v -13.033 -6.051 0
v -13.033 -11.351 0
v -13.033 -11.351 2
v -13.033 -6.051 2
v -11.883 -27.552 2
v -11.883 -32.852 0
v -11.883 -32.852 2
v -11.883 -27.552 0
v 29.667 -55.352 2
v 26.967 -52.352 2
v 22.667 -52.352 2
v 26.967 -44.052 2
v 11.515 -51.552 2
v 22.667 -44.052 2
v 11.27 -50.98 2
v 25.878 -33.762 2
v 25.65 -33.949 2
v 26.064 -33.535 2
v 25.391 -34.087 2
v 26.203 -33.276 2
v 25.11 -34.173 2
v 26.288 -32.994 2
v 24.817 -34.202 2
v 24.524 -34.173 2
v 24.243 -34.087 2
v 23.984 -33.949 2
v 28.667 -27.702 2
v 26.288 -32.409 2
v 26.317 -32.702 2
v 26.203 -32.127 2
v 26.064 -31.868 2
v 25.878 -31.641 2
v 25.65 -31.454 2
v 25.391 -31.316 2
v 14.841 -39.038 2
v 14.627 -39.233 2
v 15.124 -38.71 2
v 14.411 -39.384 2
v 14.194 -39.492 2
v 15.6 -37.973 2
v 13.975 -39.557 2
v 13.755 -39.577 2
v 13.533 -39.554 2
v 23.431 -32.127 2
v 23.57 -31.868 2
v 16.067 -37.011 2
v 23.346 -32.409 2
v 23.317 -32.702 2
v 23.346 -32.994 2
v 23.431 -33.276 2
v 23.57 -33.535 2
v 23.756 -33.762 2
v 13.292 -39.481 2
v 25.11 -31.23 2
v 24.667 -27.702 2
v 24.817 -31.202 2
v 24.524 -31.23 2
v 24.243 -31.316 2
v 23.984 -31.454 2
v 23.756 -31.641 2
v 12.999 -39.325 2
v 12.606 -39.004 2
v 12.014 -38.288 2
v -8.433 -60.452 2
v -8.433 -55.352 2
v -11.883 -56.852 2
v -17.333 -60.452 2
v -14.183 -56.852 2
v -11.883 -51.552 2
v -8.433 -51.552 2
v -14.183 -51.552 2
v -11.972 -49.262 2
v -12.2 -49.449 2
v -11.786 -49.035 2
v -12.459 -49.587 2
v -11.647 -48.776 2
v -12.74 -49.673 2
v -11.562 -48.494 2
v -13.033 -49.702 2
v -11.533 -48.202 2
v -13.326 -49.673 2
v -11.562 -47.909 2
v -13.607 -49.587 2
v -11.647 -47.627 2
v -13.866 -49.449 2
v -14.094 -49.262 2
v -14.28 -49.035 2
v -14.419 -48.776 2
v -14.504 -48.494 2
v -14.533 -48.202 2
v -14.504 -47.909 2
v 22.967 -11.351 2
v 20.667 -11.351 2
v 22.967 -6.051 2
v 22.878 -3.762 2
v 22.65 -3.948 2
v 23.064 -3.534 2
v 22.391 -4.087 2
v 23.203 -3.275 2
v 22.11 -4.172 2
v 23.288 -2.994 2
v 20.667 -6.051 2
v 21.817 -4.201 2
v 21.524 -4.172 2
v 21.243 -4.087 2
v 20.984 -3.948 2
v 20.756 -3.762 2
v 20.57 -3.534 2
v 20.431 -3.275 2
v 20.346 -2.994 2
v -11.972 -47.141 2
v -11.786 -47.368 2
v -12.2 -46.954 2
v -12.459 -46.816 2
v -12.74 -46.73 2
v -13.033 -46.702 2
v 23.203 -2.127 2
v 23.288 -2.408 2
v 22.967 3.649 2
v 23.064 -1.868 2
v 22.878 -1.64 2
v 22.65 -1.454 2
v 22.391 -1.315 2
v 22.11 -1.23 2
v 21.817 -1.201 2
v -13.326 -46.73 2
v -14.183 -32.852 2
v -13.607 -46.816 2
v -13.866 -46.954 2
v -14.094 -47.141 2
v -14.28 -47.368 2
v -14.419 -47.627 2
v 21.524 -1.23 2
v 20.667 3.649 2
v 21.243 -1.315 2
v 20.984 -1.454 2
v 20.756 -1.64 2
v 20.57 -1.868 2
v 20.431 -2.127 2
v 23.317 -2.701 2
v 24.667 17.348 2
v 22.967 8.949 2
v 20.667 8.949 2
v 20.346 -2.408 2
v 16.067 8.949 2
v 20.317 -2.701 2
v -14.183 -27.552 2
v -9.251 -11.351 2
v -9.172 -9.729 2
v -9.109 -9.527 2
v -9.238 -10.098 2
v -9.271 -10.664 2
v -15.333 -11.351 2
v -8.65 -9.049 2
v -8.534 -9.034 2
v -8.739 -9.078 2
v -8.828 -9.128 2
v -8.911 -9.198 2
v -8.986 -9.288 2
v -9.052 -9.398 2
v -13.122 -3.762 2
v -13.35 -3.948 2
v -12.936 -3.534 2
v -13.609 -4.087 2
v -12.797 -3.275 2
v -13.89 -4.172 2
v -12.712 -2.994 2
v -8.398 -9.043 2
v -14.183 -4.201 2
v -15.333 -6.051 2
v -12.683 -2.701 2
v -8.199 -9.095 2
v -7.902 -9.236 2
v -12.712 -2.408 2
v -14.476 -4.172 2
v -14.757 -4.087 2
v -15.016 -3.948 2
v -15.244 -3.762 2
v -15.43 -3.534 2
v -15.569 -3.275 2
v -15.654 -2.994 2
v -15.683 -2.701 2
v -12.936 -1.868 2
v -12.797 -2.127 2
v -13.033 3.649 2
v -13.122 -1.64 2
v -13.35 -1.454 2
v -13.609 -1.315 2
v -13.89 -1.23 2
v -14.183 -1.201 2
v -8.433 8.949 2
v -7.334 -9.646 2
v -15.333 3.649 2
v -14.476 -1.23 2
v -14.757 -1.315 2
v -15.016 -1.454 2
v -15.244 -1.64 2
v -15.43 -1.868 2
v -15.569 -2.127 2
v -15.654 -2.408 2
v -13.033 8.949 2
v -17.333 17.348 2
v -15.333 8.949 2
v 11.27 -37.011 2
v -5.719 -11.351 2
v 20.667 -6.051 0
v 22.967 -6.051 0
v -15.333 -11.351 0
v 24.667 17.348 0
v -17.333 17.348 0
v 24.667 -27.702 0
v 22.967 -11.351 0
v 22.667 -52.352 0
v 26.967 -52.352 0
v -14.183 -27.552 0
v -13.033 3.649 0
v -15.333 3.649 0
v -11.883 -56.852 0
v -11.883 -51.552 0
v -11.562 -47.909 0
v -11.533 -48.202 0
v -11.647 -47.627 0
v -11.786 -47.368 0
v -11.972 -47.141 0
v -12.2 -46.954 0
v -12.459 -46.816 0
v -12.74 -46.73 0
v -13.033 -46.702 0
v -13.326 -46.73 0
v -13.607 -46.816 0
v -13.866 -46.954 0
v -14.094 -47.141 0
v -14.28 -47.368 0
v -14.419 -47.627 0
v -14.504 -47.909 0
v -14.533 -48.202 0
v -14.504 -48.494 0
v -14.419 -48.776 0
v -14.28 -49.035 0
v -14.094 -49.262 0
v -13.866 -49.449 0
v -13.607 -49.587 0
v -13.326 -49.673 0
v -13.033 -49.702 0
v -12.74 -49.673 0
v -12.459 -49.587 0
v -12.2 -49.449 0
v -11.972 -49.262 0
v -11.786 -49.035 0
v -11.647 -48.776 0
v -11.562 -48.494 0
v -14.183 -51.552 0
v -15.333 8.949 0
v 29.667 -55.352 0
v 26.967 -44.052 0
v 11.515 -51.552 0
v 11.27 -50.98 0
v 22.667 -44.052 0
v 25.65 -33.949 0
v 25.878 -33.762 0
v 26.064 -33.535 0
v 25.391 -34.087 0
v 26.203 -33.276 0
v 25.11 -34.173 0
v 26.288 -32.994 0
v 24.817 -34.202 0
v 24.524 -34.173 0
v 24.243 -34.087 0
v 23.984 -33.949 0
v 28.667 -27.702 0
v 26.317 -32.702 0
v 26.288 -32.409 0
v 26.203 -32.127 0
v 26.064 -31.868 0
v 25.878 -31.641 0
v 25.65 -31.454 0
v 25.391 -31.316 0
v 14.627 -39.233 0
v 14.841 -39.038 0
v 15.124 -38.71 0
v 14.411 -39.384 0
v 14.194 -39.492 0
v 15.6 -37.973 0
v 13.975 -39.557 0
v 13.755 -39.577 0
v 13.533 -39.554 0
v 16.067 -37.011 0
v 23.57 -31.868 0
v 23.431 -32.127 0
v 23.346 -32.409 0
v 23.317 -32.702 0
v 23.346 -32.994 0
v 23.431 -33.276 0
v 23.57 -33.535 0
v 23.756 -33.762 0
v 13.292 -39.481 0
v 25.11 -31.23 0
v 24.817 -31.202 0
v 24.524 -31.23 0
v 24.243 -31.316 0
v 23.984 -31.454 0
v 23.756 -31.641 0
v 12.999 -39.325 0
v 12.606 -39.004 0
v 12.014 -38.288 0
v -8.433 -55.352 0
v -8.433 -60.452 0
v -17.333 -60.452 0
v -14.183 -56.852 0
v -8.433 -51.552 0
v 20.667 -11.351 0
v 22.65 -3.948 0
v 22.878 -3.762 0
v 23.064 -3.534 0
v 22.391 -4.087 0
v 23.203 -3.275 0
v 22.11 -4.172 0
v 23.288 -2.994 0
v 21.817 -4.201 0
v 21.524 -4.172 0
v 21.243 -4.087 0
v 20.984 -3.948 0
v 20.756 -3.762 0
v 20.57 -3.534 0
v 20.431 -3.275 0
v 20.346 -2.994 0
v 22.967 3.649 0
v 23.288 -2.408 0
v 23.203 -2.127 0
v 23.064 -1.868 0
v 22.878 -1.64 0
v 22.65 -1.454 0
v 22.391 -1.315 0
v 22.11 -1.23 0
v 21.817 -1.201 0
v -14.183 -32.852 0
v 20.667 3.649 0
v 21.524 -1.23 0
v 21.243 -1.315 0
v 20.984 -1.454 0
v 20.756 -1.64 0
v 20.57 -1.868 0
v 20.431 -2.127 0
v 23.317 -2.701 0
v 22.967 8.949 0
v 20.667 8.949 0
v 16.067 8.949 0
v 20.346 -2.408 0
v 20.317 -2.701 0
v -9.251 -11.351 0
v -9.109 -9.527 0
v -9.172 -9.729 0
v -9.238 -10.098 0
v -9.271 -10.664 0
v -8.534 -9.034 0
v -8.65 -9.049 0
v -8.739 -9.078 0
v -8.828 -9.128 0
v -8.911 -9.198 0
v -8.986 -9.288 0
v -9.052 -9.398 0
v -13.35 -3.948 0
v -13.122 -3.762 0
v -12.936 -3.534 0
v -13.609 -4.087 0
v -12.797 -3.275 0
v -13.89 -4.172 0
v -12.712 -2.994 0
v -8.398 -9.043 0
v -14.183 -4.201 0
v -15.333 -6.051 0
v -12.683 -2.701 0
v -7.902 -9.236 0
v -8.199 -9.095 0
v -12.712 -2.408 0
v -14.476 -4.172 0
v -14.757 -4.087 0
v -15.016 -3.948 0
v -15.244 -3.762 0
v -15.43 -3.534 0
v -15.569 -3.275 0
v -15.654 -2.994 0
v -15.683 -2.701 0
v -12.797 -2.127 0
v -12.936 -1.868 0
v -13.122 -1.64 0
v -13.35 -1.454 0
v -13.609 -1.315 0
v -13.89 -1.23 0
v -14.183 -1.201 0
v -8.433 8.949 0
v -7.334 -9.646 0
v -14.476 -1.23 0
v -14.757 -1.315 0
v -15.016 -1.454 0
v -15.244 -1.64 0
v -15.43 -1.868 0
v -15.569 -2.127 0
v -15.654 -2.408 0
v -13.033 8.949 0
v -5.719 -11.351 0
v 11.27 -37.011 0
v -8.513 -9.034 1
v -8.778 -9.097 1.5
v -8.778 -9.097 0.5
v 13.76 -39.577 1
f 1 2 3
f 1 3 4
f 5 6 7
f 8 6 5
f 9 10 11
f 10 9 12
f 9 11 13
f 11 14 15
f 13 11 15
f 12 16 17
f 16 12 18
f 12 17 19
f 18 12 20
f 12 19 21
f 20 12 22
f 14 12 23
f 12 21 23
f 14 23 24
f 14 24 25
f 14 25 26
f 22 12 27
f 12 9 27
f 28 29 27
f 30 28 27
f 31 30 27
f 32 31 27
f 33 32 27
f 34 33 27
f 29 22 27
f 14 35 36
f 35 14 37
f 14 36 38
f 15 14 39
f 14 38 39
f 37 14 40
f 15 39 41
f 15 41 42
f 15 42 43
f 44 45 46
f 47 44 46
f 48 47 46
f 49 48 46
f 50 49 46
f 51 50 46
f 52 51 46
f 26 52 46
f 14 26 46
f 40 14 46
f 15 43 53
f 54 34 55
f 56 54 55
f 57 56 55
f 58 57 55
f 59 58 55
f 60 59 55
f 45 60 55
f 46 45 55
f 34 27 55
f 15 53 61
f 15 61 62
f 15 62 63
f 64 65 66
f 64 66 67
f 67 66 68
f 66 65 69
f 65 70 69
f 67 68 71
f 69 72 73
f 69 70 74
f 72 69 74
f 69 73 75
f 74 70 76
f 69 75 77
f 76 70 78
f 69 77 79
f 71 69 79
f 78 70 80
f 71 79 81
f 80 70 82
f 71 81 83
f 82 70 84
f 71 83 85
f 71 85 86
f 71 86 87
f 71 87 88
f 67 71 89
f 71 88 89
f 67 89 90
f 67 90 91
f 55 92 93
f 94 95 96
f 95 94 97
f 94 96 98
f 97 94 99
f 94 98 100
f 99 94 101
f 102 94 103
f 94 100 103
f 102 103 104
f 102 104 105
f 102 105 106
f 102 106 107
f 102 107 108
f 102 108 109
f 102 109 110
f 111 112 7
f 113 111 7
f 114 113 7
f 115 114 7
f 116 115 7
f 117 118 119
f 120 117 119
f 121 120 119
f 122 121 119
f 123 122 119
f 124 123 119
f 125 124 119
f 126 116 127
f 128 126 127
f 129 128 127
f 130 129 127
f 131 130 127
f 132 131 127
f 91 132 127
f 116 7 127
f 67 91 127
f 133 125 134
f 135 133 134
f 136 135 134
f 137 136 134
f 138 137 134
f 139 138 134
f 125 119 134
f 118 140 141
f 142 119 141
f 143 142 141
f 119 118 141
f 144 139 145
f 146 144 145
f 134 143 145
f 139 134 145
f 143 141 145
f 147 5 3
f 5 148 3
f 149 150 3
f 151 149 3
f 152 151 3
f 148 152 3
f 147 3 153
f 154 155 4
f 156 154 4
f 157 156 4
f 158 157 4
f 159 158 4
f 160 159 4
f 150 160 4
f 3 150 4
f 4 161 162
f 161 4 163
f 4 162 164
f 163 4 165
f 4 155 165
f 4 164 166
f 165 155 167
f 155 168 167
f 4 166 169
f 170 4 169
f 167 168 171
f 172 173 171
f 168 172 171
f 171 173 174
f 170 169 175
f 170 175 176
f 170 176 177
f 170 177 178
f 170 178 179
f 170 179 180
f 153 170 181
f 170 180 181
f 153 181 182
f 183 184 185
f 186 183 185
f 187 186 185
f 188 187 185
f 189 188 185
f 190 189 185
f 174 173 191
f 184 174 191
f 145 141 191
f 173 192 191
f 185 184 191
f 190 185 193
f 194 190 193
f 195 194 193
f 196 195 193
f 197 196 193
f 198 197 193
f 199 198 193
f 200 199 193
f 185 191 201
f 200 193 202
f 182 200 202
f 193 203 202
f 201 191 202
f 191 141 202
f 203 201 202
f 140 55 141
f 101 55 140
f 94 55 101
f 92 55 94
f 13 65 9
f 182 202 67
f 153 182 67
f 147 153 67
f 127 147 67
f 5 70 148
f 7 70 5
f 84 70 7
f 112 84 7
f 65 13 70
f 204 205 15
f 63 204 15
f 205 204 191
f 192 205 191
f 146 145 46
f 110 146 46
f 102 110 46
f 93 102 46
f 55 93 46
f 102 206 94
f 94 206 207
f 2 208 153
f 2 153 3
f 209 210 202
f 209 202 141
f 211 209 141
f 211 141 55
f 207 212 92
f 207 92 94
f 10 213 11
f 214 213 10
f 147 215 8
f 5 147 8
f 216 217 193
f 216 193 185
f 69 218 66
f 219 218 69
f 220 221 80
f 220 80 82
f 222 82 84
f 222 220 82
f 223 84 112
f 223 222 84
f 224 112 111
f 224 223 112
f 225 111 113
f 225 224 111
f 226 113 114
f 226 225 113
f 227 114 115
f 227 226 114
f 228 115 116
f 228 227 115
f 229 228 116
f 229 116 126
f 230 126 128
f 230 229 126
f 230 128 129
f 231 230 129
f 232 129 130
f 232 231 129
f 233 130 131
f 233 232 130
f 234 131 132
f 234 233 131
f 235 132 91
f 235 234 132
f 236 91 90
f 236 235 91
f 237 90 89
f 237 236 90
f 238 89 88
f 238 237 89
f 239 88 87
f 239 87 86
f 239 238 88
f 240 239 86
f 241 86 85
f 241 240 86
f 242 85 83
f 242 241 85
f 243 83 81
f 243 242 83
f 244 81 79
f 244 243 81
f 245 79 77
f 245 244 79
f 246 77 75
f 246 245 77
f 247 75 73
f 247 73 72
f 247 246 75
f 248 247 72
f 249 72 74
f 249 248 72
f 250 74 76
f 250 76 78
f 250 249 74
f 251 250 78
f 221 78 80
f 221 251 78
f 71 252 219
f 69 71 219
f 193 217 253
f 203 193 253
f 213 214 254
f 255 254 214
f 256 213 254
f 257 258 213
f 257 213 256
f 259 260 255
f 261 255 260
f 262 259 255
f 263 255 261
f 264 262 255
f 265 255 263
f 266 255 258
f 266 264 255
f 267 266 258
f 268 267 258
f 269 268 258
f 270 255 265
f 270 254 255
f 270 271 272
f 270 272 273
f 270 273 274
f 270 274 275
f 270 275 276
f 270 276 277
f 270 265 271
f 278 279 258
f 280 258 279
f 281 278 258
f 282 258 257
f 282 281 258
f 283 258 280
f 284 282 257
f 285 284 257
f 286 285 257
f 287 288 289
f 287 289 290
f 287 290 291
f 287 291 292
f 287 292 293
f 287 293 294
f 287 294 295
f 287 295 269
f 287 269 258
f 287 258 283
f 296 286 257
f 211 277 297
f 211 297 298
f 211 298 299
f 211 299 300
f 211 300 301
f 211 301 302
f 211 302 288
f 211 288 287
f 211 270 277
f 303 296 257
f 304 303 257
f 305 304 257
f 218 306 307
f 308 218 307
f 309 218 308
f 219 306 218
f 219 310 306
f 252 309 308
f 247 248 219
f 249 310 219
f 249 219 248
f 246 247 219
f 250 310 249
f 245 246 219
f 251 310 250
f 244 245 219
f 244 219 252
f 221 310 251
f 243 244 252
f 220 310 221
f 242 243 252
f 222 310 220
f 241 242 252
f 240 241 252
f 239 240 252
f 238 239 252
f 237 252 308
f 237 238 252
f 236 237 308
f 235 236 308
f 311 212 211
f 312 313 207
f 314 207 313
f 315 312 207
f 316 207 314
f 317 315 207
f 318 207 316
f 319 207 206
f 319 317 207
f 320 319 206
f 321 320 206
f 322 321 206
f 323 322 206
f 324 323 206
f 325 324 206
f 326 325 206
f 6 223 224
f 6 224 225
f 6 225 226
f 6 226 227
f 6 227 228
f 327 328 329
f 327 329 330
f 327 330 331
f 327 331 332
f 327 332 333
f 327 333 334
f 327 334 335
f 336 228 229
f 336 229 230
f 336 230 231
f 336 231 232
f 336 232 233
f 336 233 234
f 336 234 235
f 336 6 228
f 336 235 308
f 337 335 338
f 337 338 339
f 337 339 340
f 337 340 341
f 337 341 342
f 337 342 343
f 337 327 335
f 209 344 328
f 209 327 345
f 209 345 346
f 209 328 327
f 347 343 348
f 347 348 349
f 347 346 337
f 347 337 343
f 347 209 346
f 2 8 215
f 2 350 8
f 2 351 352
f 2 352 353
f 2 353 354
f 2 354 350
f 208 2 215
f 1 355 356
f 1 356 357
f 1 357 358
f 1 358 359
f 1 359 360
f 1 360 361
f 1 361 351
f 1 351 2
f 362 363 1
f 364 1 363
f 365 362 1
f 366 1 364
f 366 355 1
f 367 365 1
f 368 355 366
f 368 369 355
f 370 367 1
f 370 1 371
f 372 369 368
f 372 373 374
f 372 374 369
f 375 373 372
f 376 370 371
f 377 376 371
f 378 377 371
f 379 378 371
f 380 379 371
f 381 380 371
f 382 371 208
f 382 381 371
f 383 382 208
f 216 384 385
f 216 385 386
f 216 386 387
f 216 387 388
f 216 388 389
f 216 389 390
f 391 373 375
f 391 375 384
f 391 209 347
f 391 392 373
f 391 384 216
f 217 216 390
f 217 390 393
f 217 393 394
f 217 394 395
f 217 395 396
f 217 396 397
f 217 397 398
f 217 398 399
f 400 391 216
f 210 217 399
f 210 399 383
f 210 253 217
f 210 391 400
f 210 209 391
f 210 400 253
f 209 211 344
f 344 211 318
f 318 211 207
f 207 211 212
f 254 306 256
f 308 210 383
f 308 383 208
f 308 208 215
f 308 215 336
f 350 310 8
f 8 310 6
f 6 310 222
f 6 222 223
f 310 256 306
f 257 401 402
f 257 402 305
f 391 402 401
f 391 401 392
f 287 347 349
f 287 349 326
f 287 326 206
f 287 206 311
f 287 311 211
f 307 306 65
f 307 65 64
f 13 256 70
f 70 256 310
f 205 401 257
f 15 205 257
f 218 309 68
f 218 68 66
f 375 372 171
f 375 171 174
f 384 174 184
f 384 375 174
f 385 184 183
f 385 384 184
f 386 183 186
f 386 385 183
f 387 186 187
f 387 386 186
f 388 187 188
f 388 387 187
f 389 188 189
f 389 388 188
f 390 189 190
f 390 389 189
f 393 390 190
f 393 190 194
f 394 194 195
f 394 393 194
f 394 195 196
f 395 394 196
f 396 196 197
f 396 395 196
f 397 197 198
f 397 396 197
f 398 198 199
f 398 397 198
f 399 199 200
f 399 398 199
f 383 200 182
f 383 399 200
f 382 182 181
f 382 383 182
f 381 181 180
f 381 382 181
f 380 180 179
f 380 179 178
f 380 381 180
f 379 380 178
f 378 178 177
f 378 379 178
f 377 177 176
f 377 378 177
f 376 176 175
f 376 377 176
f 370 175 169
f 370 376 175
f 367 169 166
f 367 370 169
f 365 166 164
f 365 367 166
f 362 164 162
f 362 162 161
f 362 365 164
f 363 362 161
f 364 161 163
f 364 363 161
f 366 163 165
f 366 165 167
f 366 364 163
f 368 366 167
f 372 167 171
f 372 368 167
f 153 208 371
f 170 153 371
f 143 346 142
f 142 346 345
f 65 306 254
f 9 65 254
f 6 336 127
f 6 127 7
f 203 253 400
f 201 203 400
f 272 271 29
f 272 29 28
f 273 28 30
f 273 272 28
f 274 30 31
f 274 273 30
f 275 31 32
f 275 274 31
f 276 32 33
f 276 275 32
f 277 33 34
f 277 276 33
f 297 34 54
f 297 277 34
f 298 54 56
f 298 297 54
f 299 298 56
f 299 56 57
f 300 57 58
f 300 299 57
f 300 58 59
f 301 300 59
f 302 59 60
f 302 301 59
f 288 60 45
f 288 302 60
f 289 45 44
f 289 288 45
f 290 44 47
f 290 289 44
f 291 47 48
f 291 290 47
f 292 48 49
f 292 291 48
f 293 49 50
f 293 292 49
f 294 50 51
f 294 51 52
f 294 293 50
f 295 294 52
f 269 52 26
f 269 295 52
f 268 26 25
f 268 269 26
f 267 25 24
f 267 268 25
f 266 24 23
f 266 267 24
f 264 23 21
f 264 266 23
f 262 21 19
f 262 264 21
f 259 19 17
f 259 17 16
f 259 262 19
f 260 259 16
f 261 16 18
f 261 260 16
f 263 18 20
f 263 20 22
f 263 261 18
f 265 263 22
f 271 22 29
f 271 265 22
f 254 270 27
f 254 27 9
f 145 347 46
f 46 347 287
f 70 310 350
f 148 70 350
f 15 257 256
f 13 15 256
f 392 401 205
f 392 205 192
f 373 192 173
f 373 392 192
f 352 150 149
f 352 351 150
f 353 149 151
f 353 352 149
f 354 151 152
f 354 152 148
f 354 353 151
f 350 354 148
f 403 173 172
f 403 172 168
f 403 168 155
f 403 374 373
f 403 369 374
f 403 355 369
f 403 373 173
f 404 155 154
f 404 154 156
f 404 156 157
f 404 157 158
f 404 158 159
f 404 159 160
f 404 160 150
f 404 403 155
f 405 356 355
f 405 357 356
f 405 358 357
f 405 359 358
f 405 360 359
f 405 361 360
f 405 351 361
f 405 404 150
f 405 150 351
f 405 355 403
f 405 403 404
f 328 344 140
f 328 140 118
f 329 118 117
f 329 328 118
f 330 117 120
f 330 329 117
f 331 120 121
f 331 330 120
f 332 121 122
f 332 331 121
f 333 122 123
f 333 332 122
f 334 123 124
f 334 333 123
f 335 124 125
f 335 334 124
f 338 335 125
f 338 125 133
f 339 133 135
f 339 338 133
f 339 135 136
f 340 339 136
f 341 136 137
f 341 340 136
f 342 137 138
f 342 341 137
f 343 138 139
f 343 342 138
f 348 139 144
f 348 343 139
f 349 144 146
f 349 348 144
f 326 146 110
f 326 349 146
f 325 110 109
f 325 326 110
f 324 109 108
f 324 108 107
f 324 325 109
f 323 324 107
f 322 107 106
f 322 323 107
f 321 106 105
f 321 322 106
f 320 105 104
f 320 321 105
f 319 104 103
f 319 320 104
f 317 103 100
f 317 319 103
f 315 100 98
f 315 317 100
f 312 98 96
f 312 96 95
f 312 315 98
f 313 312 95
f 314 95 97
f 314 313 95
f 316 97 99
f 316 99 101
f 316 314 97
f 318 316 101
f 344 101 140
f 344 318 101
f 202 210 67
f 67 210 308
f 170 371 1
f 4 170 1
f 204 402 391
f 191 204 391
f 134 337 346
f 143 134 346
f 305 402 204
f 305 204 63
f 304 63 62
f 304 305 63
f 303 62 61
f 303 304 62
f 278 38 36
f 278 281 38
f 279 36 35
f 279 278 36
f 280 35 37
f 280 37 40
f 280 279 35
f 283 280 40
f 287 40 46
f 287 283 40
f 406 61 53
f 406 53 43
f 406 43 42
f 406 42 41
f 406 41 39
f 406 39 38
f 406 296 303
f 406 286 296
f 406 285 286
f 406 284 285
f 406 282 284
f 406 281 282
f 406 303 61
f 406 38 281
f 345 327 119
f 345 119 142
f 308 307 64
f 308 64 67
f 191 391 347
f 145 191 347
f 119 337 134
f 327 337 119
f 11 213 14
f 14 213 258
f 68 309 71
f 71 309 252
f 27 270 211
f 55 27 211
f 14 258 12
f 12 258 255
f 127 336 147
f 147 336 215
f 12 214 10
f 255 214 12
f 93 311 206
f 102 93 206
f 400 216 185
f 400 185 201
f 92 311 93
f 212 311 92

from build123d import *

# Parameters (mm, degrees)
SKETCH_1_R      = 1.5
SKETCH_1_W      = 2.3
SKETCH_1_H      = 5.3
SKETCH_1_W_2    = 4.3
SKETCH_1_H_2    = 8.3
EXTRUDE_1_DEPTH = 2


with BuildPart() as part:
    # 草图1 → 凸台-拉伸1 (new body)
    with BuildSketch(Plane.XY):
        Polygon((24.667061038, 17.348475873), (24.667061038, -27.701524127), (26.667061038, -27.701524127), (28.667061038, -27.701524127), (29.667061038, -55.351524127), (22.667061038, -55.351524127), (20.667061038, -55.351524127), (-8.432938962, -55.351524127), (-8.432938962, -60.451524127), (-17.332938962, -60.451524127), (-17.332938962, -14.651524127), (-17.332938962, -11.651524127), (-17.332938962, 17.348475873), align=None)
        with Locations((-14.182938962, -2.700971973)):
            Circle(SKETCH_1_R, mode=Mode.SUBTRACT)
        with Locations((21.817061038, -2.700971973)):
            Circle(SKETCH_1_R, mode=Mode.SUBTRACT)
        with Locations((24.817061038, -32.701524127)):
            Circle(SKETCH_1_R, mode=Mode.SUBTRACT)
        with Locations((-13.032938962, -48.201524127)):
            Circle(SKETCH_1_R, mode=Mode.SUBTRACT)
        with Locations((-14.182938962, -8.700971973)):
            Rectangle(SKETCH_1_W, SKETCH_1_H, mode=Mode.SUBTRACT)
        with Locations((-14.182938962, 6.299028027)):
            Rectangle(SKETCH_1_W, SKETCH_1_H, mode=Mode.SUBTRACT)
        with Locations((21.817061038, 6.299028027)):
            Rectangle(SKETCH_1_W, SKETCH_1_H, mode=Mode.SUBTRACT)
        with Locations((21.817061038, -8.700971973)):
            Rectangle(SKETCH_1_W, SKETCH_1_H, mode=Mode.SUBTRACT)
        with Locations((24.817061038, -48.201524127)):
            Rectangle(SKETCH_1_W_2, SKETCH_1_H_2, mode=Mode.SUBTRACT)
        with BuildLine():
            Line((-8.432938962, 8.949028027), (16.067061038, 8.949028027))
            Line((16.067061038, 8.949028027), (16.067061038, -37.010661405))
            add(Edge.make_bspline(
                [(11.269624681, -37.010661405), (13.852400302, -42.144100828), (16.067061038, -37.010661405)],
                knots=[0, 0, 0, 1, 1, 1], degree=2))
            Line((11.269624681, -37.010661405), (-8.432938962, 8.949028027))
        make_face(mode=Mode.SUBTRACT)
        with BuildLine():
            Line((-8.432938962, -51.551524127), (-9.251133438, -11.350971973))
            add(Edge.make_bspline(
                [(-5.718997159, -11.350971973), (-9.541336837, -6.716135438), (-9.251133438, -11.350971973)],
                knots=[0, 0, 0, 1, 1, 1], degree=2))
            Line((-5.718997159, -11.350971973), (11.269624681, -50.979915585))
            Line((11.269624681, -50.979915585), (11.514668845, -51.551524127))
            Line((11.514668845, -51.551524127), (-8.432938962, -51.551524127))
        make_face(mode=Mode.SUBTRACT)
        with Locations((-13.032938962, -54.201524127)):
            Rectangle(SKETCH_1_W, SKETCH_1_H, mode=Mode.SUBTRACT)
        with Locations((-13.032938962, -30.201524127)):
            Rectangle(SKETCH_1_W, SKETCH_1_H, mode=Mode.SUBTRACT)
    extrude(amount=EXTRUDE_1_DEPTH)


solid = part.part
